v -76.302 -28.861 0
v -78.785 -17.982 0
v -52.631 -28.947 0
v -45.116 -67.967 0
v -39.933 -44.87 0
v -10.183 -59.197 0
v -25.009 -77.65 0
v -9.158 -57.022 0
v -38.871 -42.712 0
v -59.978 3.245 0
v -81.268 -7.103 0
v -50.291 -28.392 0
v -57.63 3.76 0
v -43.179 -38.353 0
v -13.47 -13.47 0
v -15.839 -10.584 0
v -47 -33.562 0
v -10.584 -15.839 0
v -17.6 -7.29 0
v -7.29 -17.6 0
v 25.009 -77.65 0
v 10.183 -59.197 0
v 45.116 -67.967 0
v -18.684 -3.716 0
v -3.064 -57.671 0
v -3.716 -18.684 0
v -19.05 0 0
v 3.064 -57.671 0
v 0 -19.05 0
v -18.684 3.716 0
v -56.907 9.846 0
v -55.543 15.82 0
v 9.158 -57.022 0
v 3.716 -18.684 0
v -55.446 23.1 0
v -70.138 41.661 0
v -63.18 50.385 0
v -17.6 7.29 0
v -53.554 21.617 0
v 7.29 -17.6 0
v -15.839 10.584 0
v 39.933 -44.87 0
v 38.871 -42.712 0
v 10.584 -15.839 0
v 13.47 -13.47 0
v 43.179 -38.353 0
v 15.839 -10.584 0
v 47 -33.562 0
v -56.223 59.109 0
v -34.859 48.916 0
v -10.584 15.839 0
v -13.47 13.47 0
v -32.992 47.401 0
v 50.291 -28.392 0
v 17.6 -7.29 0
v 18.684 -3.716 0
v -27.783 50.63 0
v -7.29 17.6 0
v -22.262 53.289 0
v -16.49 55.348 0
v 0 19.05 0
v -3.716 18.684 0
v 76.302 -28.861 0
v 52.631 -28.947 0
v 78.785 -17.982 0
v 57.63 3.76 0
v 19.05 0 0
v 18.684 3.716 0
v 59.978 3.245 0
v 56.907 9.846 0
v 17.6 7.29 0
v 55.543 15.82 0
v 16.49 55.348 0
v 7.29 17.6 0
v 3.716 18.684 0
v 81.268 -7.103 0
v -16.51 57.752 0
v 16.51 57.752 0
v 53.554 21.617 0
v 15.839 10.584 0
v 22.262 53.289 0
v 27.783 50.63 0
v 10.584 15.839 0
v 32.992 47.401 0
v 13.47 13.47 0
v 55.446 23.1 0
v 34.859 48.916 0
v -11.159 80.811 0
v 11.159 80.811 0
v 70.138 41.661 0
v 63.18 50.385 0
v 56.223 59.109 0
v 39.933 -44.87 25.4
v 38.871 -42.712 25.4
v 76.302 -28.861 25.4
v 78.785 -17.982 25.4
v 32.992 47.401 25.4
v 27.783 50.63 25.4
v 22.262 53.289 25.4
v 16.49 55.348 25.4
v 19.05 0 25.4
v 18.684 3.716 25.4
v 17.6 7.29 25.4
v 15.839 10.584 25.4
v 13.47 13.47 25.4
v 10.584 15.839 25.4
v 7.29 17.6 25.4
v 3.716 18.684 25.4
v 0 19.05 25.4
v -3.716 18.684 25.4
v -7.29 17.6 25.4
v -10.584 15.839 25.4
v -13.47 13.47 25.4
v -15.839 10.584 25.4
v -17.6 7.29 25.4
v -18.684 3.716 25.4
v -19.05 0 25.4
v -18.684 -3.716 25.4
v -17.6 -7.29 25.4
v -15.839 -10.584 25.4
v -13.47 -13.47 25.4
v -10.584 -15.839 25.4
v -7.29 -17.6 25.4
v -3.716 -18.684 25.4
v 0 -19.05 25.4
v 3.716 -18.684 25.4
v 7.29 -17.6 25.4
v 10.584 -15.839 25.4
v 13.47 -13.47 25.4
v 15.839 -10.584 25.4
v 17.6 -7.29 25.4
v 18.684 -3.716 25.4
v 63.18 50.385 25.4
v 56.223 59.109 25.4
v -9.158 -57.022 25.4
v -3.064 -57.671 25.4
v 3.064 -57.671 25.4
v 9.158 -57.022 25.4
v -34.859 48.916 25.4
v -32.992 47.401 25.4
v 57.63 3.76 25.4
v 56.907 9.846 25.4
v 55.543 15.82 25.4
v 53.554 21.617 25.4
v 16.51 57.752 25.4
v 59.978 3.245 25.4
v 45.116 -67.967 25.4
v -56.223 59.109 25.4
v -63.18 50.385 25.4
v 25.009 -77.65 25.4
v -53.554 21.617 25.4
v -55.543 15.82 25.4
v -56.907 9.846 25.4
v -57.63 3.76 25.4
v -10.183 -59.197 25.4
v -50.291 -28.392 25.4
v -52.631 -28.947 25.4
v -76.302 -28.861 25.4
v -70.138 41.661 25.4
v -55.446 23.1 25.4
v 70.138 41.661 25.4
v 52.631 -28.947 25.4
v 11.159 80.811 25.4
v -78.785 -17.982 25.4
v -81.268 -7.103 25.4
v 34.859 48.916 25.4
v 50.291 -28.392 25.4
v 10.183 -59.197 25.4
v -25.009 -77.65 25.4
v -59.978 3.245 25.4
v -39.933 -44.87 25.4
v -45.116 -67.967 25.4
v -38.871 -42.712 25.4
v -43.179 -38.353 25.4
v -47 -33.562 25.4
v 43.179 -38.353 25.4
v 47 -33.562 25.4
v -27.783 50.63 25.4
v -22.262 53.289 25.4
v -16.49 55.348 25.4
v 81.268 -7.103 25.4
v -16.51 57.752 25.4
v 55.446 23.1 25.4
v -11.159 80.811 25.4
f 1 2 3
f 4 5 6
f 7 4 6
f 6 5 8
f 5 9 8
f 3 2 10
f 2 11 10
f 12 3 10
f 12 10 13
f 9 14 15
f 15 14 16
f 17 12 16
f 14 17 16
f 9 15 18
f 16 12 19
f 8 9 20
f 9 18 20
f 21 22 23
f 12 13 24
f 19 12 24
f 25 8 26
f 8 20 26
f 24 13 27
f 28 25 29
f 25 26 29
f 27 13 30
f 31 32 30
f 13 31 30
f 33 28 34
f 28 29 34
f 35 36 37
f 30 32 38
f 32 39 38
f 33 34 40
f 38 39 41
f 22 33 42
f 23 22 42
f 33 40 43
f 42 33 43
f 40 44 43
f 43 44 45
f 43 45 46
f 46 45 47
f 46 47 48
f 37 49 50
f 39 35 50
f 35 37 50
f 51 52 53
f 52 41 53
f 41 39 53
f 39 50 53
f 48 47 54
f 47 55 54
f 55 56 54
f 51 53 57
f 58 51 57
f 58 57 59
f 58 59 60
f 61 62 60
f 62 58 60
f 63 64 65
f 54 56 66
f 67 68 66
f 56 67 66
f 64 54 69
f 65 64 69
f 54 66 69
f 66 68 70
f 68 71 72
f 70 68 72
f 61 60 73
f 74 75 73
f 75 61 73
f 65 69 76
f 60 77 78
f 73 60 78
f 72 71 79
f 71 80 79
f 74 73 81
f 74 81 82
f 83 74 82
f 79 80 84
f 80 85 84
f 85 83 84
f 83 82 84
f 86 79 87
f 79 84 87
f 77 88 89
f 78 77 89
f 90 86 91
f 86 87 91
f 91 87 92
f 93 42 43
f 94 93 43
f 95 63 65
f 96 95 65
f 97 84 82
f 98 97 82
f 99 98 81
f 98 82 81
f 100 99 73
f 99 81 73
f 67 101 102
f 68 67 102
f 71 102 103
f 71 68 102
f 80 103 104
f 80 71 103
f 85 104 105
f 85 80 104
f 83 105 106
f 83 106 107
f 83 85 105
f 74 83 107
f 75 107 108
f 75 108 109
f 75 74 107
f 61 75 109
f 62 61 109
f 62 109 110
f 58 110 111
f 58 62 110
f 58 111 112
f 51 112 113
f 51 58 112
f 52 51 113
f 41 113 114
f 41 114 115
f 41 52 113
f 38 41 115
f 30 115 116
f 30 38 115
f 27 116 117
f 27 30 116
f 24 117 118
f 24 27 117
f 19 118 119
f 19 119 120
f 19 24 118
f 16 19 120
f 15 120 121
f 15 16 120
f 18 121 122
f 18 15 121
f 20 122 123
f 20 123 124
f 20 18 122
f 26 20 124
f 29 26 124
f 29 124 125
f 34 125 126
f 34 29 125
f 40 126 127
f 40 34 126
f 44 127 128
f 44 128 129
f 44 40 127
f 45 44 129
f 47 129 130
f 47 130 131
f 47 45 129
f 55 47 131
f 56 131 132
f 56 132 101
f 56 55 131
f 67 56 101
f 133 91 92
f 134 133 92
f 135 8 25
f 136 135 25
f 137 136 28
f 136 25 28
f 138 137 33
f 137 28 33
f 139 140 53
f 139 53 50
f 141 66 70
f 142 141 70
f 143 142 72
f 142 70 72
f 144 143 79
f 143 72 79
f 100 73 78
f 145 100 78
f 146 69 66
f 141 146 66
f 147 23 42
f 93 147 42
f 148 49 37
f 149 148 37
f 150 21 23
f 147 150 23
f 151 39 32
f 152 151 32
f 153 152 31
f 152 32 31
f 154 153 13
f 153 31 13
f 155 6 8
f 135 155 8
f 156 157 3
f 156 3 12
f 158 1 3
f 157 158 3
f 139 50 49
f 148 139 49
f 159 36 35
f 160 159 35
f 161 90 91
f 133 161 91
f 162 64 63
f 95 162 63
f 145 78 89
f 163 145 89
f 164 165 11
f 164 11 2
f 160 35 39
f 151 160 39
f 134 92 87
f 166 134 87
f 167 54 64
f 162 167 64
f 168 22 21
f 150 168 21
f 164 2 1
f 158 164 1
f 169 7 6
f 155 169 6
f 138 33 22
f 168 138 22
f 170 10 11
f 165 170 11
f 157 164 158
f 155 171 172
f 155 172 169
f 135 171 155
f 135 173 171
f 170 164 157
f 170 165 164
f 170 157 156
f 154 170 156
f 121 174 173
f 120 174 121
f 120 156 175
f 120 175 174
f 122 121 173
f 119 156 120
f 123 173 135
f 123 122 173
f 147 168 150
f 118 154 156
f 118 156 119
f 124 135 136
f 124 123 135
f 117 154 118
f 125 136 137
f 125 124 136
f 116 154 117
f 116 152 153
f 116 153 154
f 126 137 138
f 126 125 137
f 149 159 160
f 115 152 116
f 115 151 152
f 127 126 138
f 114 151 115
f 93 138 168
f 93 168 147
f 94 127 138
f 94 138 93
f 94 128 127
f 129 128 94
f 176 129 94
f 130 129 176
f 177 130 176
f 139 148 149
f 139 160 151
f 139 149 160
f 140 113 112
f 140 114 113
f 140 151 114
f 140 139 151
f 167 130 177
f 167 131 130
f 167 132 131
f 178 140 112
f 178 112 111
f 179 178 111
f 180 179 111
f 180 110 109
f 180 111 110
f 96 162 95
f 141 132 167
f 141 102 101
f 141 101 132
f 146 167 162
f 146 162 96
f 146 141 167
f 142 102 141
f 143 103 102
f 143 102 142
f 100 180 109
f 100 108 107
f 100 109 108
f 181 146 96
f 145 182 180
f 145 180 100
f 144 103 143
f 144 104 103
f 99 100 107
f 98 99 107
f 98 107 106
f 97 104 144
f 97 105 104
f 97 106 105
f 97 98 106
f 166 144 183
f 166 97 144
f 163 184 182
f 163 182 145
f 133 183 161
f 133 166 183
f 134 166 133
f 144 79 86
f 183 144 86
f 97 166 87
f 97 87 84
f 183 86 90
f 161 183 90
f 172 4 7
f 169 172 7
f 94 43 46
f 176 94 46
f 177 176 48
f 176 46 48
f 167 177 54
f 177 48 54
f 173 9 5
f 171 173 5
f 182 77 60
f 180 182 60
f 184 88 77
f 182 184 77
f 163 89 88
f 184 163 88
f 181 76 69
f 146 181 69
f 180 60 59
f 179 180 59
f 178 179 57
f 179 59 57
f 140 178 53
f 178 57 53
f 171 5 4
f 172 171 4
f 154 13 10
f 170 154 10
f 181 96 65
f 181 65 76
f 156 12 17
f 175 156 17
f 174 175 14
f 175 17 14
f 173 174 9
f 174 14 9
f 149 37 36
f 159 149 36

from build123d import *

# Parameters (mm, degrees)
F0_R     = 19.05
F1_DEPTH = 25.4


with BuildPart() as f1:
    # F0 (on Top) → F1 (new body)
    with BuildSketch(Plane.XY):
        with BuildLine():
            Line((-10.182837, -59.196547), (-9.157953, -57.02169))
            ThreePointArc((-9.157953, -57.02169), (-25.057833, -52.033126), (-38.871462, -42.712418))
            Line((-38.871462, -42.712418), (-39.932829, -44.869706))
            Line((-39.932829, -44.869706), (-45.115972, -67.966514))
            Line((-45.115972, -67.966514), (-35.062492, -72.808015))
            Line((-35.062492, -72.808015), (-25.009012, -77.649516))
            Line((-25.009012, -77.649516), (-10.182837, -59.196547))
        make_face()
        with BuildLine():
            Line((-52.630619, -28.947181), (-50.291243, -28.392466))
            ThreePointArc((-50.291243, -28.392466), (-56.30444, -12.851121), (-57.629873, 3.760176))
            Line((-57.629873, 3.760176), (-59.97826, 3.244939))
            Line((-59.97826, 3.244939), (-81.267709, -7.103341))
            Line((-81.267709, -7.103341), (-78.784705, -17.982095))
            Line((-78.784705, -17.982095), (-76.3017, -28.860849))
            Line((-76.3017, -28.860849), (-52.630619, -28.947181))
        make_face()
        with BuildLine():
            ThreePointArc((-53.554201, 21.616864), (-45.152655, 36.008041), (-32.991815, 47.401281))
            Line((-32.991815, 47.401281), (-34.858838, 48.916078))
            Line((-34.858838, 48.916078), (-56.223203, 59.108793))
            Line((-56.223203, 59.108793), (-63.180428, 50.38471))
            Line((-63.180428, 50.38471), (-70.137652, 41.660627))
            Line((-70.137652, 41.660627), (-55.446471, 23.100003))
            Line((-55.446471, 23.100003), (-53.554201, 21.616864))
        make_face()
        with BuildLine():
            ThreePointArc((32.991815, 47.401281), (45.152655, 36.008041), (53.554201, 21.616864))
            Line((53.554201, 21.616864), (55.446471, 23.100003))
            Line((55.446471, 23.100003), (70.137652, 41.660627))
            Line((70.137652, 41.660627), (63.180428, 50.38471))
            Line((63.180428, 50.38471), (56.223203, 59.108793))
            Line((56.223203, 59.108793), (34.858838, 48.916078))
            Line((34.858838, 48.916078), (32.991815, 47.401281))
        make_face()
        with BuildLine():
            ThreePointArc((0, 57.752413), (8.332046, 57.148213), (16.489754, 55.348254))
            Line((16.489754, 55.348254), (16.51, 57.752413))
            Line((16.51, 57.752413), (11.158521, 80.8108))
            Line((11.158521, 80.8108), (0, 80.8108))
            Line((0, 80.8108), (0, 57.752413))
        make_face()
        with BuildLine():
            ThreePointArc((-16.489754, 55.348254), (-8.332046, 57.148213), (0, 57.752413))
            Line((0, 57.752413), (0, 80.8108))
            Line((0, 80.8108), (-11.158521, 80.8108))
            Line((-11.158521, 80.8108), (-16.51, 57.752413))
            Line((-16.51, 57.752413), (-16.489754, 55.348254))
        make_face()
        with BuildLine():
            ThreePointArc((57.629873, 3.760176), (57.72177, 1.881086), (57.752413, 0))
            ThreePointArc((57.752413, 0), (55.855984, -14.678225), (50.291243, -28.392466))
            Line((50.291243, -28.392466), (52.630619, -28.947181))
            Line((52.630619, -28.947181), (76.3017, -28.860849))
            Line((76.3017, -28.860849), (78.784705, -17.982095))
            Line((78.784705, -17.982095), (81.267709, -7.103341))
            Line((81.267709, -7.103341), (59.97826, 3.244939))
            Line((59.97826, 3.244939), (57.629873, 3.760176))
        make_face()
        with BuildLine():
            Line((39.932829, -44.869706), (38.871462, -42.712418))
            ThreePointArc((38.871462, -42.712418), (25.057833, -52.033126), (9.157953, -57.02169))
            Line((9.157953, -57.02169), (10.182837, -59.196547))
            Line((10.182837, -59.196547), (25.009012, -77.649516))
            Line((25.009012, -77.649516), (35.062492, -72.808015))
            Line((35.062492, -72.808015), (45.115972, -67.966514))
            Line((45.115972, -67.966514), (39.932829, -44.869706))
        make_face()
        with BuildLine():
            ThreePointArc((50.291243, -28.392466), (55.855984, -14.678225), (57.752413, 0))
            ThreePointArc((57.752413, 0), (57.72177, 1.881086), (57.629873, 3.760176))
            ThreePointArc((57.629873, 3.760176), (56.30444, 12.851121), (53.554201, 21.616864))
            ThreePointArc((53.554201, 21.616864), (45.152655, 36.008041), (32.991815, 47.401281))
            ThreePointArc((32.991815, 47.401281), (25.057833, 52.033126), (16.489754, 55.348254))
            ThreePointArc((16.489754, 55.348254), (8.332046, 57.148213), (0, 57.752413))
            ThreePointArc((0, 57.752413), (-8.332046, 57.148213), (-16.489754, 55.348254))
            ThreePointArc((-16.489754, 55.348254), (-25.057833, 52.033126), (-32.991815, 47.401281))
            ThreePointArc((-32.991815, 47.401281), (-45.152655, 36.008041), (-53.554201, 21.616864))
            ThreePointArc((-53.554201, 21.616864), (-56.30444, 12.851121), (-57.629873, 3.760176))
            ThreePointArc((-57.629873, 3.760176), (-56.30444, -12.851121), (-50.291243, -28.392466))
            ThreePointArc((-50.291243, -28.392466), (-45.152655, -36.008041), (-38.871462, -42.712418))
            ThreePointArc((-38.871462, -42.712418), (-25.057833, -52.033126), (-9.157953, -57.02169))
            ThreePointArc((-9.157953, -57.02169), (0, -57.752413), (9.157953, -57.02169))
            ThreePointArc((9.157953, -57.02169), (25.057833, -52.033126), (38.871462, -42.712418))
            ThreePointArc((38.871462, -42.712418), (45.152655, -36.008041), (50.291243, -28.392466))
        make_face()
        Circle(F0_R, mode=Mode.SUBTRACT)
    extrude(amount=F1_DEPTH)


solid = f1.part
